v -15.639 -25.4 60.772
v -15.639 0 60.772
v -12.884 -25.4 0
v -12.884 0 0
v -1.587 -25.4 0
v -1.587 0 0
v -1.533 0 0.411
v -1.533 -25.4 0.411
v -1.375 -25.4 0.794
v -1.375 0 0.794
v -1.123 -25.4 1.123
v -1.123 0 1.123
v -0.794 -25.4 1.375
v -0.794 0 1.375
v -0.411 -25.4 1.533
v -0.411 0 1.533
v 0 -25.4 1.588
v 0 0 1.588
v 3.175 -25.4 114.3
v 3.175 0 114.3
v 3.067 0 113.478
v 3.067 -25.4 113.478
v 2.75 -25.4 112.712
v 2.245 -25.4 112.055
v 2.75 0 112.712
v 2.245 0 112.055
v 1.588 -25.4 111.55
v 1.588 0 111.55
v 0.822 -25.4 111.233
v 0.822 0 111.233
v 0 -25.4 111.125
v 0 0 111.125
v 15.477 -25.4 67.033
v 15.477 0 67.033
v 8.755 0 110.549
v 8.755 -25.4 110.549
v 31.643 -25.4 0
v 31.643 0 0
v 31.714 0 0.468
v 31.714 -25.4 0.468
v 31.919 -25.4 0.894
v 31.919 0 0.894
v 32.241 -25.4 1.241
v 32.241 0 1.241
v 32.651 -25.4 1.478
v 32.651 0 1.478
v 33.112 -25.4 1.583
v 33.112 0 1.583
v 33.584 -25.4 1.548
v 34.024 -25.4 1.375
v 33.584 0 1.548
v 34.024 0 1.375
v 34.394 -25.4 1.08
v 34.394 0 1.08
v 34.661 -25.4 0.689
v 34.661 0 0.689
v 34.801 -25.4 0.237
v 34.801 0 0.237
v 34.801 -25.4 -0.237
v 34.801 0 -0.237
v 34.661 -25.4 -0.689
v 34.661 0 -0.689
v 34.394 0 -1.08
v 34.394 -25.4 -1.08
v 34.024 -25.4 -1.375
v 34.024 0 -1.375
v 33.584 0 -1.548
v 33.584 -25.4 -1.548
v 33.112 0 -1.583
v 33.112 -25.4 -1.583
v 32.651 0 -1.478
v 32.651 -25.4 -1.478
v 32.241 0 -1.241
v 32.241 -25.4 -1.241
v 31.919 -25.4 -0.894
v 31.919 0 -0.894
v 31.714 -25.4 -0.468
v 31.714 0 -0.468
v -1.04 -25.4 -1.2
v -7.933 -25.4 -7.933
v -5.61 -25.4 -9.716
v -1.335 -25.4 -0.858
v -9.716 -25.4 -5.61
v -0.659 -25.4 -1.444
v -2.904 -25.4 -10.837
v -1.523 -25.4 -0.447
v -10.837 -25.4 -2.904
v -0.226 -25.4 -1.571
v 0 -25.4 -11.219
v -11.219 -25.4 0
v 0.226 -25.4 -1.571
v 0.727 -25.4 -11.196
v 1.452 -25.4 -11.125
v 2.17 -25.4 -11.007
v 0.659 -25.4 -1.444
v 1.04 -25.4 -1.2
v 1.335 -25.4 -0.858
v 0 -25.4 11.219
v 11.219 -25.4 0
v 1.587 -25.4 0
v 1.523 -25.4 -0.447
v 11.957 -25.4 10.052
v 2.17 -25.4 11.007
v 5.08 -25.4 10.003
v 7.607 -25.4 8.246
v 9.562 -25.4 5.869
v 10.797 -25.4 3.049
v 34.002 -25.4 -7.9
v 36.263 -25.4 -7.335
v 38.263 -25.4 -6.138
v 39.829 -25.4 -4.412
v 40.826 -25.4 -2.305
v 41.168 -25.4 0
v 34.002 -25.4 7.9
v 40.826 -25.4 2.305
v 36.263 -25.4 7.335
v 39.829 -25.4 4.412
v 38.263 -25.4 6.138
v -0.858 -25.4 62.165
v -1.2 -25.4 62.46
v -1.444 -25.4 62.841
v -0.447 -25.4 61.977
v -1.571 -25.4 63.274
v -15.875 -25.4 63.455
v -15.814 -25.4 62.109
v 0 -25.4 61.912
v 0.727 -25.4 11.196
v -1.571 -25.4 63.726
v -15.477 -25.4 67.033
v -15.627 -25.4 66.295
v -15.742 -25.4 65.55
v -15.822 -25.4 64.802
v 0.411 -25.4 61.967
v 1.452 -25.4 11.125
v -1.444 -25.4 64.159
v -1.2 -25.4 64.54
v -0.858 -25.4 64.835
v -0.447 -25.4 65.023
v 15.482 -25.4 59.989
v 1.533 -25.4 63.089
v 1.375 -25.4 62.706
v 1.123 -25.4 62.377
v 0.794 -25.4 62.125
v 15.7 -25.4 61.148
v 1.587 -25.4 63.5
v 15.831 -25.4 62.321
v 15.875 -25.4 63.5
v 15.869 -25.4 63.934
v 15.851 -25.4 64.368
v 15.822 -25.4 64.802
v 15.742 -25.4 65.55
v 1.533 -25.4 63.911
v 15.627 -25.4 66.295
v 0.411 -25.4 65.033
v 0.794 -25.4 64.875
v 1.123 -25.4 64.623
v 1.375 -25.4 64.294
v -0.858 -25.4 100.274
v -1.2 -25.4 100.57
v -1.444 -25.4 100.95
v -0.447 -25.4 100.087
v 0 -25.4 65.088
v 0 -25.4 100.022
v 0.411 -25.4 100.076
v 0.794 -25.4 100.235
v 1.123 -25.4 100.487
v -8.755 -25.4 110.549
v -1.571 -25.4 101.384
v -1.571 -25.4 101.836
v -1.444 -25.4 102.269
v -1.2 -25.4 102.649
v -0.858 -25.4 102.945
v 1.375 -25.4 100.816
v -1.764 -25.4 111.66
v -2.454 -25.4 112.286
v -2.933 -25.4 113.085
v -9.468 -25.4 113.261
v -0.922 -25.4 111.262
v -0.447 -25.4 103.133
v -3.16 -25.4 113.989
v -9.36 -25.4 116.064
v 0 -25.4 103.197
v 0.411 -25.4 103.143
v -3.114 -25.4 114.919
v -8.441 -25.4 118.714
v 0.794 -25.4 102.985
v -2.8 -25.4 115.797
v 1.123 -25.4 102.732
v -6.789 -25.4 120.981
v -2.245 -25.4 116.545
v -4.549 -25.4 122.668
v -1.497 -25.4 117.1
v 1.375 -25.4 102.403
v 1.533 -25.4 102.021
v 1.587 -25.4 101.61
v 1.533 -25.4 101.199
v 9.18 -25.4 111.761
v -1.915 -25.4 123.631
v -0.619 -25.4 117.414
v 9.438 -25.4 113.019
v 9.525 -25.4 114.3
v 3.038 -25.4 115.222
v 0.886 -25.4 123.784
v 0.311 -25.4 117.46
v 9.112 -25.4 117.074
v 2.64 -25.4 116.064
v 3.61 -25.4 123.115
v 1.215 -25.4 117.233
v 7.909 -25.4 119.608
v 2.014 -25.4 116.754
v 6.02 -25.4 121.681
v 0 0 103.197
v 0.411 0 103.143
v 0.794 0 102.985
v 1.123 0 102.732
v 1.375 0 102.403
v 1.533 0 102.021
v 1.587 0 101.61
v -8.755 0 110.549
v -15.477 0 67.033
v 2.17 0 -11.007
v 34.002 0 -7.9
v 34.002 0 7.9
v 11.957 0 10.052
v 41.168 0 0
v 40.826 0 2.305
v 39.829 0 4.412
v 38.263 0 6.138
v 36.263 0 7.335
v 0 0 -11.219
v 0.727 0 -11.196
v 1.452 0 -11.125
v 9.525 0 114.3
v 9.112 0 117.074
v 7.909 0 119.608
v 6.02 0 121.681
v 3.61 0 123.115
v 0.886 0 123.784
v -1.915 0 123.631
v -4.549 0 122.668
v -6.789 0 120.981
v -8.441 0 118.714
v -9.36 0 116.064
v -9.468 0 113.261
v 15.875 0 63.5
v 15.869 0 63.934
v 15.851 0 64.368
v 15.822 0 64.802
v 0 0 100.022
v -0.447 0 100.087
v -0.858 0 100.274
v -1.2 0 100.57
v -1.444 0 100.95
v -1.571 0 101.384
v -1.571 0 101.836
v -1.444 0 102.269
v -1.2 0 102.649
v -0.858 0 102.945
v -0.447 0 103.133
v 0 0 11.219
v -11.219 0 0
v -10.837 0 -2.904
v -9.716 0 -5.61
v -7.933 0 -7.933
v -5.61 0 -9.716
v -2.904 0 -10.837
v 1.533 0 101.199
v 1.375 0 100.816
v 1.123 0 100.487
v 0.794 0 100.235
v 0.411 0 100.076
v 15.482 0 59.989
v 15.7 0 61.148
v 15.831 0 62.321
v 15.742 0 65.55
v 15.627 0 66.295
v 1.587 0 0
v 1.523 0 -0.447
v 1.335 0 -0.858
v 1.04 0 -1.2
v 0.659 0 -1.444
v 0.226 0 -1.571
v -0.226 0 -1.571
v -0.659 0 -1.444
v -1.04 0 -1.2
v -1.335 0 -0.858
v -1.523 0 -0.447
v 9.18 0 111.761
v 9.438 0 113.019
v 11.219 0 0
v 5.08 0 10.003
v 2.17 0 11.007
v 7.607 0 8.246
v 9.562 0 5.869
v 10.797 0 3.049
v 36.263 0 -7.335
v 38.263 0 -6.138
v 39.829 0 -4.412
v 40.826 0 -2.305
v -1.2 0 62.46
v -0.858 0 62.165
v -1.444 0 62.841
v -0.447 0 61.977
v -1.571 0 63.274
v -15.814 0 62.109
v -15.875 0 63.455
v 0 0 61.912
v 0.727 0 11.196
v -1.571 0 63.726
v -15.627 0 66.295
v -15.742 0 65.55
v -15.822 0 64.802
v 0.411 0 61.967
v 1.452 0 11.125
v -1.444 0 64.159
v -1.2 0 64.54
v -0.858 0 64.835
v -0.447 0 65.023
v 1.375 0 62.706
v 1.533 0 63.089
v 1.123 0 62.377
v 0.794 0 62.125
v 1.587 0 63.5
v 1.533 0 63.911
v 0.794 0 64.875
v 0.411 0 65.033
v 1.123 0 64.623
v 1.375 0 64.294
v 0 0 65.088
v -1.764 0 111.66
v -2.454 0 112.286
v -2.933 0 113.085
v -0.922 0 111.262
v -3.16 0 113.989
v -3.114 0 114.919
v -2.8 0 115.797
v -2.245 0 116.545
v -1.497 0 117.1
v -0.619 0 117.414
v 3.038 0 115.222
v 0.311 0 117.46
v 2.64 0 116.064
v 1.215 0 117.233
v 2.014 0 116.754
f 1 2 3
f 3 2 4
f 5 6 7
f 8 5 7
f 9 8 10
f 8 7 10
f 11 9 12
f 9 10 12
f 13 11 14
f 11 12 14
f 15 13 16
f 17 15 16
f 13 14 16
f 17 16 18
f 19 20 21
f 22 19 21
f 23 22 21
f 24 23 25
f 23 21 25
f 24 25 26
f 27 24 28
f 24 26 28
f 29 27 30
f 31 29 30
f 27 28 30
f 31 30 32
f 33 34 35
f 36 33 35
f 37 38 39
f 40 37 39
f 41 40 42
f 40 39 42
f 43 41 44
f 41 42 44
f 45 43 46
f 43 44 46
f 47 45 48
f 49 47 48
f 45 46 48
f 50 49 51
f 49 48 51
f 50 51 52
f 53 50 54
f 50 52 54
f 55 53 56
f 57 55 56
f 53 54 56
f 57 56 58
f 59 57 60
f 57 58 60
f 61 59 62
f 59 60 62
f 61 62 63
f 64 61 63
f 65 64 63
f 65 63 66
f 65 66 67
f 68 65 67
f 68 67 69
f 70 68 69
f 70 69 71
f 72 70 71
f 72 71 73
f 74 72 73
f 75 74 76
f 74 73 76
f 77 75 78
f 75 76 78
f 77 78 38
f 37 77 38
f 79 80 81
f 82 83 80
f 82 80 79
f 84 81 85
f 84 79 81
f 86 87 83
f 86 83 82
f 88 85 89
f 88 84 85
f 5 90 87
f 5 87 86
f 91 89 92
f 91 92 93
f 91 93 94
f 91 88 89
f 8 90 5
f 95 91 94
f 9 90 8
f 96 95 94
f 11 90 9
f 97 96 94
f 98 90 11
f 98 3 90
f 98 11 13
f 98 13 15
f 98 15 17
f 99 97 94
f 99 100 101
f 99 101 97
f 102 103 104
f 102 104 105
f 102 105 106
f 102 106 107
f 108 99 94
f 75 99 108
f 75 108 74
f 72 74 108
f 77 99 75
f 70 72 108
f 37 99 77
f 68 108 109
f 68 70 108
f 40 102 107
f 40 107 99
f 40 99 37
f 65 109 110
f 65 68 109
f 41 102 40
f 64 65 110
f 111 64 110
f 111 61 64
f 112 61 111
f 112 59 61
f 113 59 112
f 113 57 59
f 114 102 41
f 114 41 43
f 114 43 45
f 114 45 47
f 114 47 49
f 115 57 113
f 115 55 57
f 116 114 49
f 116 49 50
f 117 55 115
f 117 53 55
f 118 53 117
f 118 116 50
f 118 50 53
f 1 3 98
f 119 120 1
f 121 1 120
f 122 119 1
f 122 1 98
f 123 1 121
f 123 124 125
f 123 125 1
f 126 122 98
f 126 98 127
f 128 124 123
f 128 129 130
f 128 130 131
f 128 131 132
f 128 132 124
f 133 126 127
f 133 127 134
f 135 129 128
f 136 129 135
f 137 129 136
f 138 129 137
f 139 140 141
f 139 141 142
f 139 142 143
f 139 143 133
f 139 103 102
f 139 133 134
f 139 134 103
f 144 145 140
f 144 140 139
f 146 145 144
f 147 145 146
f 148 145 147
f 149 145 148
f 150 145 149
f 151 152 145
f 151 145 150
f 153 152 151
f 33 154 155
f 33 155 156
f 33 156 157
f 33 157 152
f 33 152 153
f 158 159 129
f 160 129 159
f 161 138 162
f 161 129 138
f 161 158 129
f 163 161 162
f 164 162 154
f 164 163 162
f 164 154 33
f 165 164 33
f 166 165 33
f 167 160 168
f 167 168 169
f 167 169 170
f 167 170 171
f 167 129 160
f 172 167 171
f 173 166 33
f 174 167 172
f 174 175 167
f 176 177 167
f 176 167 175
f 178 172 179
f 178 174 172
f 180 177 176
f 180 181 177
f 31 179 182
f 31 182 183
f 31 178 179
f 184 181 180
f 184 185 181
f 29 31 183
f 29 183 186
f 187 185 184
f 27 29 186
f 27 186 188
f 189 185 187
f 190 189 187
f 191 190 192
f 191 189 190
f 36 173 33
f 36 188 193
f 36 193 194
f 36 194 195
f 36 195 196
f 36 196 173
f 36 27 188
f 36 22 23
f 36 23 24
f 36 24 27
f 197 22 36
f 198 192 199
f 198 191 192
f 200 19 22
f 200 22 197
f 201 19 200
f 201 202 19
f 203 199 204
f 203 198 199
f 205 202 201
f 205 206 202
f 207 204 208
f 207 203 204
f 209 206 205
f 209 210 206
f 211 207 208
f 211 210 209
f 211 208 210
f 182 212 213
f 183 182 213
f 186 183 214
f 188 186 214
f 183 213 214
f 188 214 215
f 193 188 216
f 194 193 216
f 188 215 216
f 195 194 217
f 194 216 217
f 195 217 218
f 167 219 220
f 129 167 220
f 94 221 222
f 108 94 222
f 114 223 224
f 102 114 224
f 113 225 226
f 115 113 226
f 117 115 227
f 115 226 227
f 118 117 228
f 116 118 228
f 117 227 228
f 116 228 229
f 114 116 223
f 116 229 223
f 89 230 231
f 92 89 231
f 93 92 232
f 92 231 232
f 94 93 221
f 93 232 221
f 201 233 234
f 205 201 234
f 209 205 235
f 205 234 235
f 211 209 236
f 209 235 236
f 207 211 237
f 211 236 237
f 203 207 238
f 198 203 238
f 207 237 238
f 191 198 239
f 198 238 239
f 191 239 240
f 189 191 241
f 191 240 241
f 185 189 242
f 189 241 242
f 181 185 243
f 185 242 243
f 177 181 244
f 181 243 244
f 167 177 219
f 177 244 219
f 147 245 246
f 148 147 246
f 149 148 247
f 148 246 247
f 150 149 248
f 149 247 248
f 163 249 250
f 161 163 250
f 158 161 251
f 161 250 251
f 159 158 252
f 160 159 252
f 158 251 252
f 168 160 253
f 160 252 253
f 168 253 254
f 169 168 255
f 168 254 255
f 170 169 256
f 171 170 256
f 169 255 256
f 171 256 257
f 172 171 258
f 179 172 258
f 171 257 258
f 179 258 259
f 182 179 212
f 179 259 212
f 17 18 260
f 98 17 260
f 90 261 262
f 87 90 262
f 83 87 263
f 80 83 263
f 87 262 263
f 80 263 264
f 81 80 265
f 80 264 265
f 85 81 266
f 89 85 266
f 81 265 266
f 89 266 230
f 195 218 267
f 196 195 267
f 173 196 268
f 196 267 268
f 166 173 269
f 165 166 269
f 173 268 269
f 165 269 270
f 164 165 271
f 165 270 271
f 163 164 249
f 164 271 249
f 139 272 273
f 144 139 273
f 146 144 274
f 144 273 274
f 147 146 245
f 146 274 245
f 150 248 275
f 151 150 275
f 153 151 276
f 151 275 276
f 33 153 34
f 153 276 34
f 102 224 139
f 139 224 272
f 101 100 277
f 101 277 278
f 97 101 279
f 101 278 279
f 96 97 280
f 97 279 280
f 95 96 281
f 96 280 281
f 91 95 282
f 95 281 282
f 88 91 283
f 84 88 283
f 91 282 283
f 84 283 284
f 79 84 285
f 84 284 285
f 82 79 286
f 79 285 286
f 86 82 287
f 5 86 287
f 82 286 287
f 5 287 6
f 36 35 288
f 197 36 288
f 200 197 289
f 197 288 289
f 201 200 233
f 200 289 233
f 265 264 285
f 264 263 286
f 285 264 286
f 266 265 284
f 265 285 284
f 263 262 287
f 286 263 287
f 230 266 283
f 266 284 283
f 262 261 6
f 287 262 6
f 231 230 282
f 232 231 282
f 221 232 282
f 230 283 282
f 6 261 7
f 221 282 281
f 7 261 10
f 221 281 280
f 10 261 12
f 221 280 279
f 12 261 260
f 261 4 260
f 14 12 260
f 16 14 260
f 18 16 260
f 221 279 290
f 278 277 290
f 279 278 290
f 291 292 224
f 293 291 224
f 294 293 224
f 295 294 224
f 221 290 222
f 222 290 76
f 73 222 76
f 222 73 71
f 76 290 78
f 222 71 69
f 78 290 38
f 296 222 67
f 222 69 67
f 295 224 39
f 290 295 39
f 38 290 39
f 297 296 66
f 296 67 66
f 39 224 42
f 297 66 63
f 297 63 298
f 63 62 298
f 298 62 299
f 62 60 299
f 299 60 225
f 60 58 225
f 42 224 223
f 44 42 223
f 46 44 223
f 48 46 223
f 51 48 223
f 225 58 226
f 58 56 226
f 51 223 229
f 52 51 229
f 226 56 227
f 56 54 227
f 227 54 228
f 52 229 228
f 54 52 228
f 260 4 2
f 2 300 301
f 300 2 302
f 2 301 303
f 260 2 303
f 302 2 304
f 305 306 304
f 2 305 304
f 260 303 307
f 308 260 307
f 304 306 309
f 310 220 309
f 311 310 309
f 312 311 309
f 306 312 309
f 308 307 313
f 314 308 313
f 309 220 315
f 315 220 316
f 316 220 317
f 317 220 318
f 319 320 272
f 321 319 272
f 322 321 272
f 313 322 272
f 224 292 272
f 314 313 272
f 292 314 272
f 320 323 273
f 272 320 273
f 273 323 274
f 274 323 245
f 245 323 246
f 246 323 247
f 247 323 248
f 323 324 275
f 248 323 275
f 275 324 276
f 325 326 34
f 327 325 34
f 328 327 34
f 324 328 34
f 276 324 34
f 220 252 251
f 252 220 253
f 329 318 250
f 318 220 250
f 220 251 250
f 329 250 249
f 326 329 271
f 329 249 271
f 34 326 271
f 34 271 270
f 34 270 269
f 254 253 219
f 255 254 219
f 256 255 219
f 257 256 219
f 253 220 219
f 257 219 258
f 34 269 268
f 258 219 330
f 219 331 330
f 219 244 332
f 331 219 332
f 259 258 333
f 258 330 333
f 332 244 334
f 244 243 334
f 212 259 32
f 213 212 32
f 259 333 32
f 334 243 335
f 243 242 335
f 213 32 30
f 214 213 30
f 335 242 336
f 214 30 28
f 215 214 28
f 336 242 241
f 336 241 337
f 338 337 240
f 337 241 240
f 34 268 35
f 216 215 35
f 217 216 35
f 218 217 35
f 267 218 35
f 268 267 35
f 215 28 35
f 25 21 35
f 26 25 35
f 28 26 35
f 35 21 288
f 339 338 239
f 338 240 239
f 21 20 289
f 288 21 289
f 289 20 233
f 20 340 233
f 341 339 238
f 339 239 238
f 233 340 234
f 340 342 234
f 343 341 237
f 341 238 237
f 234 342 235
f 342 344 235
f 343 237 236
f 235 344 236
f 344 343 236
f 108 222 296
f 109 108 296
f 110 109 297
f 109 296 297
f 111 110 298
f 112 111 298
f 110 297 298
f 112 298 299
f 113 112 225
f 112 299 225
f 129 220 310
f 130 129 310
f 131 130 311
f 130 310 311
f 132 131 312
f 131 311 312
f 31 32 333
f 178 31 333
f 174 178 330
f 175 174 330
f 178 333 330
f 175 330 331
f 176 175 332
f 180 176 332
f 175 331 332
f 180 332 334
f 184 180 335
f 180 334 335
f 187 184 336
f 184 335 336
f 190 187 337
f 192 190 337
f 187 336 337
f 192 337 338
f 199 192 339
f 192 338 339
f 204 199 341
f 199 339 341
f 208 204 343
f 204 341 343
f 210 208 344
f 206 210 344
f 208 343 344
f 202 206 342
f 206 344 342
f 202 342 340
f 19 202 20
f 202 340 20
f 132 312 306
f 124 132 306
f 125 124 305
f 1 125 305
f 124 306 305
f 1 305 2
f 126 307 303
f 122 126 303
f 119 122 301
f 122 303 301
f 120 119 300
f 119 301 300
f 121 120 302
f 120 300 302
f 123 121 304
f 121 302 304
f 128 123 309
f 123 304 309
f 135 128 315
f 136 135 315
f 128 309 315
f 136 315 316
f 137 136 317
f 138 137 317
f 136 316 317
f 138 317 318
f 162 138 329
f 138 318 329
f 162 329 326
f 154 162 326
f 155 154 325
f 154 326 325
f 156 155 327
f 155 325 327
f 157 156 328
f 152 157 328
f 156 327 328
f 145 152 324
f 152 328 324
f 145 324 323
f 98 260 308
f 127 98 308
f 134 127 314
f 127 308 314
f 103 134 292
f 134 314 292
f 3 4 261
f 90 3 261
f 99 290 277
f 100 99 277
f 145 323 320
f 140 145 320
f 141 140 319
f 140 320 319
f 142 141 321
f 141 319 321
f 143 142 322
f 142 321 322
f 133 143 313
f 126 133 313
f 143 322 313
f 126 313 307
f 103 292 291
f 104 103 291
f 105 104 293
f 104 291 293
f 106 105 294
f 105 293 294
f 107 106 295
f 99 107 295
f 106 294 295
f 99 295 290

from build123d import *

# Parameters (mm, degrees)
F1_DEPTH = 25.4


with BuildPart() as f1:
    # F0 (on Front) → F1 (new body)
    with BuildSketch(Plane.XZ):
        with BuildLine():
            ThreePointArc((-1.5875, 0), (-1.1225320151, 1.1225320151), (0, 1.5875))
            Line((0, 1.5875), (0, 11.2192574161))
            ThreePointArc((0, 11.2192574161), (-7.9332129988, 7.9332129988), (-11.2192574161, 0))
            Line((-11.2192574161, 0), (-1.5875, 0))
        make_face()
        with BuildLine():
            Line((11.2192574161, 0), (1.5875, 0))
            ThreePointArc((1.5875, 0), (0, -1.5875), (-1.5875, 0))
            Line((-1.5875, 0), (-11.2192574161, 0))
            ThreePointArc((-11.2192574161, 0), (-7.9332129988, -7.9332129988), (0, -11.2192574161))
            Line((0, -11.2192574161), (2.1697970219, -11.007439205))
            ThreePointArc((2.1697970219, -11.007439205), (8.6664654935, -7.1248938813), (11.2192574161, 0))
        make_face()
        with BuildLine():
            ThreePointArc((-11.2192574161, 0), (-7.9332129988, 7.9332129988), (0, 11.2192574161))
            Line((0, 11.2192574161), (0, 47.625))
            ThreePointArc((0, 47.625), (-10.2155761082, 51.3485544162), (-15.6389312991, 60.7724639652))
            Line((-15.6389312991, 60.7724639652), (-12.8842582926, 0))
            Line((-12.8842582926, 0), (-11.2192574161, 0))
        make_face()
        with BuildLine():
            Line((0, 47.625), (0, 11.2192574161))
            ThreePointArc((0, 11.2192574161), (1.0900557407, 11.166177298), (2.1697970219, 11.007439205))
            Line((2.1697970219, 11.007439205), (11.9567549914, 10.0520245243))
            Line((11.9567549914, 10.0520245243), (15.4818237673, 59.9887669064))
            ThreePointArc((15.4818237673, 59.9887669064), (9.9064322447, 51.0952337716), (0, 47.625))
        make_face()
        with BuildLine():
            ThreePointArc((2.1697970219, 11.007439205), (8.6664654935, 7.1248938813), (11.2192574161, 0))
            Line((11.2192574161, 0), (11.2471757098, 0))
            Line((11.2471757098, 0), (11.9567549914, 10.0520245243))
            Line((11.9567549914, 10.0520245243), (2.1697970219, 11.007439205))
        make_face()
        with BuildLine():
            Line((11.2471757098, 0), (11.2192574161, 0))
            ThreePointArc((11.2192574161, 0), (8.6664654935, -7.1248938813), (2.1697970219, -11.007439205))
            Line((2.1697970219, -11.007439205), (34.0019449122, -7.8999464061))
            ThreePointArc((34.0019449122, -7.8999464061), (27.8977093115, -5.8790018171), (25.2932425839, 0))
            Line((25.2932425839, 0), (11.2471757098, 0))
        make_face()
        with BuildLine():
            ThreePointArc((-15.6389312991, 60.7724639652), (-10.2155761082, 51.3485544162), (0, 47.625))
            Line((0, 47.625), (0, 61.9125))
            ThreePointArc((0, 61.9125), (-1.5875, 63.5), (0, 65.0875))
            Line((0, 65.0875), (0, 79.375))
            ThreePointArc((0, 79.375), (-9.8977227148, 75.9117166444), (-15.47687934, 67.0329634722))
            Line((-15.47687934, 67.0329634722), (-15.8215583064, 64.8015059575))
            Line((-15.8215583064, 64.8015059575), (-15.6389312991, 60.7724639652))
        make_face()
        with BuildLine():
            Line((0, 61.9125), (0, 47.625))
            ThreePointArc((0, 47.625), (9.9064322447, 51.0952337716), (15.4818237673, 59.9887669064))
            Line((15.4818237673, 59.9887669064), (15.8215583064, 64.8015059575))
            Line((15.8215583064, 64.8015059575), (15.47687934, 67.0329634722))
            ThreePointArc((15.47687934, 67.0329634722), (9.8977227148, 75.9117166444), (0, 79.375))
            Line((0, 79.375), (0, 65.0875))
            ThreePointArc((0, 65.0875), (1.1225320151, 64.6225320151), (1.5875, 63.5))
            ThreePointArc((1.5875, 63.5), (1.1225320151, 62.3774679849), (0, 61.9125))
        make_face()
        with BuildLine():
            Line((11.9567549914, 10.0520245243), (11.2471757098, 0))
            Line((11.2471757098, 0), (25.2932425839, 0))
            ThreePointArc((25.2932425839, 0), (27.8977093115, 5.8790018171), (34.0019449122, 7.8999464061))
            Line((34.0019449122, 7.8999464061), (11.9567549914, 10.0520245243))
        make_face()
        with BuildLine():
            ThreePointArc((0, -11.2192574161), (1.0900557407, -11.166177298), (2.1697970219, -11.007439205))
            Line((2.1697970219, -11.007439205), (0, -11.2192574161))
        make_face()
        with BuildLine():
            ThreePointArc((-15.8215583064, 64.8015059575), (-15.8587167324, 62.7811616306), (-15.6389312991, 60.7724639652))
            Line((-15.6389312991, 60.7724639652), (-15.8215583064, 64.8015059575))
        make_face()
        with BuildLine():
            Line((15.8215583064, 64.8015059575), (15.4818237673, 59.9887669064))
            ThreePointArc((15.4818237673, 59.9887669064), (15.7763997367, 61.7334110985), (15.875, 63.5))
            ThreePointArc((15.875, 63.5), (15.8616339498, 64.1513013458), (15.8215583064, 64.8015059575))
        make_face()
        with BuildLine():
            ThreePointArc((34.0019449122, 7.8999464061), (27.8977093115, 5.8790018171), (25.2932425839, 0))
            ThreePointArc((25.2932425839, 0), (27.8977093115, -5.8790018171), (34.0019449122, -7.8999464061))
            ThreePointArc((34.0019449122, -7.8999464061), (39.109744401, -5.3330332724), (41.1682425839, 0))
            ThreePointArc((41.1682425839, 0), (39.109744401, 5.3330332724), (34.0019449122, 7.8999464061))
        make_face()
        with BuildLine():
            ThreePointArc((34.8182425839, 0), (33.2307425839, -1.5875), (31.6432425839, 0))
            ThreePointArc((31.6432425839, 0), (33.2307425839, 1.5875), (34.8182425839, 0))
        make_face(mode=Mode.SUBTRACT)
        with BuildLine():
            ThreePointArc((-15.47687934, 67.0329634722), (-15.6889419795, 65.9233704967), (-15.8215583064, 64.8015059575))
            Line((-15.8215583064, 64.8015059575), (-15.47687934, 67.0329634722))
        make_face()
        with BuildLine():
            Line((15.47687934, 67.0329634722), (15.8215583064, 64.8015059575))
            ThreePointArc((15.8215583064, 64.8015059575), (15.6889419795, 65.9233704967), (15.47687934, 67.0329634722))
        make_face()
        with BuildLine():
            ThreePointArc((-15.47687934, 67.0329634722), (-9.8977227148, 75.9117166444), (0, 79.375))
            Line((0, 79.375), (0, 100.0221994281))
            ThreePointArc((0, 100.0221994281), (-1.5875, 101.6096994281), (0, 103.1971994281))
            Line((0, 103.1971994281), (0, 104.775))
            ThreePointArc((0, 104.775), (-5.2438523258, 106.3484191644), (-8.755257881, 110.5488555831))
            Line((-8.755257881, 110.5488555831), (-15.47687934, 67.0329634722))
        make_face()
        with BuildLine():
            Line((0, 100.0221994281), (0, 79.375))
            ThreePointArc((0, 79.375), (9.8977227148, 75.9117166444), (15.47687934, 67.0329634722))
            Line((15.47687934, 67.0329634722), (8.755257881, 110.5488555831))
            ThreePointArc((8.755257881, 110.5488555831), (5.2438523258, 106.3484191644), (0, 104.775))
            Line((0, 104.775), (0, 103.1971994281))
            ThreePointArc((0, 103.1971994281), (1.1225320151, 102.7322314432), (1.5875, 101.6096994281))
            ThreePointArc((1.5875, 101.6096994281), (1.1225320151, 100.4871674129), (0, 100.0221994281))
        make_face()
        with BuildLine():
            ThreePointArc((9.525, 114.3), (-1.9146531909, 123.6305802691), (-8.755257881, 110.5488555831))
            ThreePointArc((-8.755257881, 110.5488555831), (-5.2438523258, 106.3484191644), (0, 104.775))
            ThreePointArc((0, 104.775), (5.2438523258, 106.3484191644), (8.755257881, 110.5488555831))
            ThreePointArc((8.755257881, 110.5488555831), (9.3305802691, 112.3853468091), (9.525, 114.3))
        make_face()
        with BuildLine():
            ThreePointArc((3.175, 114.3), (2.2450640303, 112.0549359697), (0, 111.125))
            ThreePointArc((0, 111.125), (-2.2450640303, 116.5450640303), (3.175, 114.3))
        make_face(mode=Mode.SUBTRACT)
    extrude(amount=F1_DEPTH)


solid = f1.part
